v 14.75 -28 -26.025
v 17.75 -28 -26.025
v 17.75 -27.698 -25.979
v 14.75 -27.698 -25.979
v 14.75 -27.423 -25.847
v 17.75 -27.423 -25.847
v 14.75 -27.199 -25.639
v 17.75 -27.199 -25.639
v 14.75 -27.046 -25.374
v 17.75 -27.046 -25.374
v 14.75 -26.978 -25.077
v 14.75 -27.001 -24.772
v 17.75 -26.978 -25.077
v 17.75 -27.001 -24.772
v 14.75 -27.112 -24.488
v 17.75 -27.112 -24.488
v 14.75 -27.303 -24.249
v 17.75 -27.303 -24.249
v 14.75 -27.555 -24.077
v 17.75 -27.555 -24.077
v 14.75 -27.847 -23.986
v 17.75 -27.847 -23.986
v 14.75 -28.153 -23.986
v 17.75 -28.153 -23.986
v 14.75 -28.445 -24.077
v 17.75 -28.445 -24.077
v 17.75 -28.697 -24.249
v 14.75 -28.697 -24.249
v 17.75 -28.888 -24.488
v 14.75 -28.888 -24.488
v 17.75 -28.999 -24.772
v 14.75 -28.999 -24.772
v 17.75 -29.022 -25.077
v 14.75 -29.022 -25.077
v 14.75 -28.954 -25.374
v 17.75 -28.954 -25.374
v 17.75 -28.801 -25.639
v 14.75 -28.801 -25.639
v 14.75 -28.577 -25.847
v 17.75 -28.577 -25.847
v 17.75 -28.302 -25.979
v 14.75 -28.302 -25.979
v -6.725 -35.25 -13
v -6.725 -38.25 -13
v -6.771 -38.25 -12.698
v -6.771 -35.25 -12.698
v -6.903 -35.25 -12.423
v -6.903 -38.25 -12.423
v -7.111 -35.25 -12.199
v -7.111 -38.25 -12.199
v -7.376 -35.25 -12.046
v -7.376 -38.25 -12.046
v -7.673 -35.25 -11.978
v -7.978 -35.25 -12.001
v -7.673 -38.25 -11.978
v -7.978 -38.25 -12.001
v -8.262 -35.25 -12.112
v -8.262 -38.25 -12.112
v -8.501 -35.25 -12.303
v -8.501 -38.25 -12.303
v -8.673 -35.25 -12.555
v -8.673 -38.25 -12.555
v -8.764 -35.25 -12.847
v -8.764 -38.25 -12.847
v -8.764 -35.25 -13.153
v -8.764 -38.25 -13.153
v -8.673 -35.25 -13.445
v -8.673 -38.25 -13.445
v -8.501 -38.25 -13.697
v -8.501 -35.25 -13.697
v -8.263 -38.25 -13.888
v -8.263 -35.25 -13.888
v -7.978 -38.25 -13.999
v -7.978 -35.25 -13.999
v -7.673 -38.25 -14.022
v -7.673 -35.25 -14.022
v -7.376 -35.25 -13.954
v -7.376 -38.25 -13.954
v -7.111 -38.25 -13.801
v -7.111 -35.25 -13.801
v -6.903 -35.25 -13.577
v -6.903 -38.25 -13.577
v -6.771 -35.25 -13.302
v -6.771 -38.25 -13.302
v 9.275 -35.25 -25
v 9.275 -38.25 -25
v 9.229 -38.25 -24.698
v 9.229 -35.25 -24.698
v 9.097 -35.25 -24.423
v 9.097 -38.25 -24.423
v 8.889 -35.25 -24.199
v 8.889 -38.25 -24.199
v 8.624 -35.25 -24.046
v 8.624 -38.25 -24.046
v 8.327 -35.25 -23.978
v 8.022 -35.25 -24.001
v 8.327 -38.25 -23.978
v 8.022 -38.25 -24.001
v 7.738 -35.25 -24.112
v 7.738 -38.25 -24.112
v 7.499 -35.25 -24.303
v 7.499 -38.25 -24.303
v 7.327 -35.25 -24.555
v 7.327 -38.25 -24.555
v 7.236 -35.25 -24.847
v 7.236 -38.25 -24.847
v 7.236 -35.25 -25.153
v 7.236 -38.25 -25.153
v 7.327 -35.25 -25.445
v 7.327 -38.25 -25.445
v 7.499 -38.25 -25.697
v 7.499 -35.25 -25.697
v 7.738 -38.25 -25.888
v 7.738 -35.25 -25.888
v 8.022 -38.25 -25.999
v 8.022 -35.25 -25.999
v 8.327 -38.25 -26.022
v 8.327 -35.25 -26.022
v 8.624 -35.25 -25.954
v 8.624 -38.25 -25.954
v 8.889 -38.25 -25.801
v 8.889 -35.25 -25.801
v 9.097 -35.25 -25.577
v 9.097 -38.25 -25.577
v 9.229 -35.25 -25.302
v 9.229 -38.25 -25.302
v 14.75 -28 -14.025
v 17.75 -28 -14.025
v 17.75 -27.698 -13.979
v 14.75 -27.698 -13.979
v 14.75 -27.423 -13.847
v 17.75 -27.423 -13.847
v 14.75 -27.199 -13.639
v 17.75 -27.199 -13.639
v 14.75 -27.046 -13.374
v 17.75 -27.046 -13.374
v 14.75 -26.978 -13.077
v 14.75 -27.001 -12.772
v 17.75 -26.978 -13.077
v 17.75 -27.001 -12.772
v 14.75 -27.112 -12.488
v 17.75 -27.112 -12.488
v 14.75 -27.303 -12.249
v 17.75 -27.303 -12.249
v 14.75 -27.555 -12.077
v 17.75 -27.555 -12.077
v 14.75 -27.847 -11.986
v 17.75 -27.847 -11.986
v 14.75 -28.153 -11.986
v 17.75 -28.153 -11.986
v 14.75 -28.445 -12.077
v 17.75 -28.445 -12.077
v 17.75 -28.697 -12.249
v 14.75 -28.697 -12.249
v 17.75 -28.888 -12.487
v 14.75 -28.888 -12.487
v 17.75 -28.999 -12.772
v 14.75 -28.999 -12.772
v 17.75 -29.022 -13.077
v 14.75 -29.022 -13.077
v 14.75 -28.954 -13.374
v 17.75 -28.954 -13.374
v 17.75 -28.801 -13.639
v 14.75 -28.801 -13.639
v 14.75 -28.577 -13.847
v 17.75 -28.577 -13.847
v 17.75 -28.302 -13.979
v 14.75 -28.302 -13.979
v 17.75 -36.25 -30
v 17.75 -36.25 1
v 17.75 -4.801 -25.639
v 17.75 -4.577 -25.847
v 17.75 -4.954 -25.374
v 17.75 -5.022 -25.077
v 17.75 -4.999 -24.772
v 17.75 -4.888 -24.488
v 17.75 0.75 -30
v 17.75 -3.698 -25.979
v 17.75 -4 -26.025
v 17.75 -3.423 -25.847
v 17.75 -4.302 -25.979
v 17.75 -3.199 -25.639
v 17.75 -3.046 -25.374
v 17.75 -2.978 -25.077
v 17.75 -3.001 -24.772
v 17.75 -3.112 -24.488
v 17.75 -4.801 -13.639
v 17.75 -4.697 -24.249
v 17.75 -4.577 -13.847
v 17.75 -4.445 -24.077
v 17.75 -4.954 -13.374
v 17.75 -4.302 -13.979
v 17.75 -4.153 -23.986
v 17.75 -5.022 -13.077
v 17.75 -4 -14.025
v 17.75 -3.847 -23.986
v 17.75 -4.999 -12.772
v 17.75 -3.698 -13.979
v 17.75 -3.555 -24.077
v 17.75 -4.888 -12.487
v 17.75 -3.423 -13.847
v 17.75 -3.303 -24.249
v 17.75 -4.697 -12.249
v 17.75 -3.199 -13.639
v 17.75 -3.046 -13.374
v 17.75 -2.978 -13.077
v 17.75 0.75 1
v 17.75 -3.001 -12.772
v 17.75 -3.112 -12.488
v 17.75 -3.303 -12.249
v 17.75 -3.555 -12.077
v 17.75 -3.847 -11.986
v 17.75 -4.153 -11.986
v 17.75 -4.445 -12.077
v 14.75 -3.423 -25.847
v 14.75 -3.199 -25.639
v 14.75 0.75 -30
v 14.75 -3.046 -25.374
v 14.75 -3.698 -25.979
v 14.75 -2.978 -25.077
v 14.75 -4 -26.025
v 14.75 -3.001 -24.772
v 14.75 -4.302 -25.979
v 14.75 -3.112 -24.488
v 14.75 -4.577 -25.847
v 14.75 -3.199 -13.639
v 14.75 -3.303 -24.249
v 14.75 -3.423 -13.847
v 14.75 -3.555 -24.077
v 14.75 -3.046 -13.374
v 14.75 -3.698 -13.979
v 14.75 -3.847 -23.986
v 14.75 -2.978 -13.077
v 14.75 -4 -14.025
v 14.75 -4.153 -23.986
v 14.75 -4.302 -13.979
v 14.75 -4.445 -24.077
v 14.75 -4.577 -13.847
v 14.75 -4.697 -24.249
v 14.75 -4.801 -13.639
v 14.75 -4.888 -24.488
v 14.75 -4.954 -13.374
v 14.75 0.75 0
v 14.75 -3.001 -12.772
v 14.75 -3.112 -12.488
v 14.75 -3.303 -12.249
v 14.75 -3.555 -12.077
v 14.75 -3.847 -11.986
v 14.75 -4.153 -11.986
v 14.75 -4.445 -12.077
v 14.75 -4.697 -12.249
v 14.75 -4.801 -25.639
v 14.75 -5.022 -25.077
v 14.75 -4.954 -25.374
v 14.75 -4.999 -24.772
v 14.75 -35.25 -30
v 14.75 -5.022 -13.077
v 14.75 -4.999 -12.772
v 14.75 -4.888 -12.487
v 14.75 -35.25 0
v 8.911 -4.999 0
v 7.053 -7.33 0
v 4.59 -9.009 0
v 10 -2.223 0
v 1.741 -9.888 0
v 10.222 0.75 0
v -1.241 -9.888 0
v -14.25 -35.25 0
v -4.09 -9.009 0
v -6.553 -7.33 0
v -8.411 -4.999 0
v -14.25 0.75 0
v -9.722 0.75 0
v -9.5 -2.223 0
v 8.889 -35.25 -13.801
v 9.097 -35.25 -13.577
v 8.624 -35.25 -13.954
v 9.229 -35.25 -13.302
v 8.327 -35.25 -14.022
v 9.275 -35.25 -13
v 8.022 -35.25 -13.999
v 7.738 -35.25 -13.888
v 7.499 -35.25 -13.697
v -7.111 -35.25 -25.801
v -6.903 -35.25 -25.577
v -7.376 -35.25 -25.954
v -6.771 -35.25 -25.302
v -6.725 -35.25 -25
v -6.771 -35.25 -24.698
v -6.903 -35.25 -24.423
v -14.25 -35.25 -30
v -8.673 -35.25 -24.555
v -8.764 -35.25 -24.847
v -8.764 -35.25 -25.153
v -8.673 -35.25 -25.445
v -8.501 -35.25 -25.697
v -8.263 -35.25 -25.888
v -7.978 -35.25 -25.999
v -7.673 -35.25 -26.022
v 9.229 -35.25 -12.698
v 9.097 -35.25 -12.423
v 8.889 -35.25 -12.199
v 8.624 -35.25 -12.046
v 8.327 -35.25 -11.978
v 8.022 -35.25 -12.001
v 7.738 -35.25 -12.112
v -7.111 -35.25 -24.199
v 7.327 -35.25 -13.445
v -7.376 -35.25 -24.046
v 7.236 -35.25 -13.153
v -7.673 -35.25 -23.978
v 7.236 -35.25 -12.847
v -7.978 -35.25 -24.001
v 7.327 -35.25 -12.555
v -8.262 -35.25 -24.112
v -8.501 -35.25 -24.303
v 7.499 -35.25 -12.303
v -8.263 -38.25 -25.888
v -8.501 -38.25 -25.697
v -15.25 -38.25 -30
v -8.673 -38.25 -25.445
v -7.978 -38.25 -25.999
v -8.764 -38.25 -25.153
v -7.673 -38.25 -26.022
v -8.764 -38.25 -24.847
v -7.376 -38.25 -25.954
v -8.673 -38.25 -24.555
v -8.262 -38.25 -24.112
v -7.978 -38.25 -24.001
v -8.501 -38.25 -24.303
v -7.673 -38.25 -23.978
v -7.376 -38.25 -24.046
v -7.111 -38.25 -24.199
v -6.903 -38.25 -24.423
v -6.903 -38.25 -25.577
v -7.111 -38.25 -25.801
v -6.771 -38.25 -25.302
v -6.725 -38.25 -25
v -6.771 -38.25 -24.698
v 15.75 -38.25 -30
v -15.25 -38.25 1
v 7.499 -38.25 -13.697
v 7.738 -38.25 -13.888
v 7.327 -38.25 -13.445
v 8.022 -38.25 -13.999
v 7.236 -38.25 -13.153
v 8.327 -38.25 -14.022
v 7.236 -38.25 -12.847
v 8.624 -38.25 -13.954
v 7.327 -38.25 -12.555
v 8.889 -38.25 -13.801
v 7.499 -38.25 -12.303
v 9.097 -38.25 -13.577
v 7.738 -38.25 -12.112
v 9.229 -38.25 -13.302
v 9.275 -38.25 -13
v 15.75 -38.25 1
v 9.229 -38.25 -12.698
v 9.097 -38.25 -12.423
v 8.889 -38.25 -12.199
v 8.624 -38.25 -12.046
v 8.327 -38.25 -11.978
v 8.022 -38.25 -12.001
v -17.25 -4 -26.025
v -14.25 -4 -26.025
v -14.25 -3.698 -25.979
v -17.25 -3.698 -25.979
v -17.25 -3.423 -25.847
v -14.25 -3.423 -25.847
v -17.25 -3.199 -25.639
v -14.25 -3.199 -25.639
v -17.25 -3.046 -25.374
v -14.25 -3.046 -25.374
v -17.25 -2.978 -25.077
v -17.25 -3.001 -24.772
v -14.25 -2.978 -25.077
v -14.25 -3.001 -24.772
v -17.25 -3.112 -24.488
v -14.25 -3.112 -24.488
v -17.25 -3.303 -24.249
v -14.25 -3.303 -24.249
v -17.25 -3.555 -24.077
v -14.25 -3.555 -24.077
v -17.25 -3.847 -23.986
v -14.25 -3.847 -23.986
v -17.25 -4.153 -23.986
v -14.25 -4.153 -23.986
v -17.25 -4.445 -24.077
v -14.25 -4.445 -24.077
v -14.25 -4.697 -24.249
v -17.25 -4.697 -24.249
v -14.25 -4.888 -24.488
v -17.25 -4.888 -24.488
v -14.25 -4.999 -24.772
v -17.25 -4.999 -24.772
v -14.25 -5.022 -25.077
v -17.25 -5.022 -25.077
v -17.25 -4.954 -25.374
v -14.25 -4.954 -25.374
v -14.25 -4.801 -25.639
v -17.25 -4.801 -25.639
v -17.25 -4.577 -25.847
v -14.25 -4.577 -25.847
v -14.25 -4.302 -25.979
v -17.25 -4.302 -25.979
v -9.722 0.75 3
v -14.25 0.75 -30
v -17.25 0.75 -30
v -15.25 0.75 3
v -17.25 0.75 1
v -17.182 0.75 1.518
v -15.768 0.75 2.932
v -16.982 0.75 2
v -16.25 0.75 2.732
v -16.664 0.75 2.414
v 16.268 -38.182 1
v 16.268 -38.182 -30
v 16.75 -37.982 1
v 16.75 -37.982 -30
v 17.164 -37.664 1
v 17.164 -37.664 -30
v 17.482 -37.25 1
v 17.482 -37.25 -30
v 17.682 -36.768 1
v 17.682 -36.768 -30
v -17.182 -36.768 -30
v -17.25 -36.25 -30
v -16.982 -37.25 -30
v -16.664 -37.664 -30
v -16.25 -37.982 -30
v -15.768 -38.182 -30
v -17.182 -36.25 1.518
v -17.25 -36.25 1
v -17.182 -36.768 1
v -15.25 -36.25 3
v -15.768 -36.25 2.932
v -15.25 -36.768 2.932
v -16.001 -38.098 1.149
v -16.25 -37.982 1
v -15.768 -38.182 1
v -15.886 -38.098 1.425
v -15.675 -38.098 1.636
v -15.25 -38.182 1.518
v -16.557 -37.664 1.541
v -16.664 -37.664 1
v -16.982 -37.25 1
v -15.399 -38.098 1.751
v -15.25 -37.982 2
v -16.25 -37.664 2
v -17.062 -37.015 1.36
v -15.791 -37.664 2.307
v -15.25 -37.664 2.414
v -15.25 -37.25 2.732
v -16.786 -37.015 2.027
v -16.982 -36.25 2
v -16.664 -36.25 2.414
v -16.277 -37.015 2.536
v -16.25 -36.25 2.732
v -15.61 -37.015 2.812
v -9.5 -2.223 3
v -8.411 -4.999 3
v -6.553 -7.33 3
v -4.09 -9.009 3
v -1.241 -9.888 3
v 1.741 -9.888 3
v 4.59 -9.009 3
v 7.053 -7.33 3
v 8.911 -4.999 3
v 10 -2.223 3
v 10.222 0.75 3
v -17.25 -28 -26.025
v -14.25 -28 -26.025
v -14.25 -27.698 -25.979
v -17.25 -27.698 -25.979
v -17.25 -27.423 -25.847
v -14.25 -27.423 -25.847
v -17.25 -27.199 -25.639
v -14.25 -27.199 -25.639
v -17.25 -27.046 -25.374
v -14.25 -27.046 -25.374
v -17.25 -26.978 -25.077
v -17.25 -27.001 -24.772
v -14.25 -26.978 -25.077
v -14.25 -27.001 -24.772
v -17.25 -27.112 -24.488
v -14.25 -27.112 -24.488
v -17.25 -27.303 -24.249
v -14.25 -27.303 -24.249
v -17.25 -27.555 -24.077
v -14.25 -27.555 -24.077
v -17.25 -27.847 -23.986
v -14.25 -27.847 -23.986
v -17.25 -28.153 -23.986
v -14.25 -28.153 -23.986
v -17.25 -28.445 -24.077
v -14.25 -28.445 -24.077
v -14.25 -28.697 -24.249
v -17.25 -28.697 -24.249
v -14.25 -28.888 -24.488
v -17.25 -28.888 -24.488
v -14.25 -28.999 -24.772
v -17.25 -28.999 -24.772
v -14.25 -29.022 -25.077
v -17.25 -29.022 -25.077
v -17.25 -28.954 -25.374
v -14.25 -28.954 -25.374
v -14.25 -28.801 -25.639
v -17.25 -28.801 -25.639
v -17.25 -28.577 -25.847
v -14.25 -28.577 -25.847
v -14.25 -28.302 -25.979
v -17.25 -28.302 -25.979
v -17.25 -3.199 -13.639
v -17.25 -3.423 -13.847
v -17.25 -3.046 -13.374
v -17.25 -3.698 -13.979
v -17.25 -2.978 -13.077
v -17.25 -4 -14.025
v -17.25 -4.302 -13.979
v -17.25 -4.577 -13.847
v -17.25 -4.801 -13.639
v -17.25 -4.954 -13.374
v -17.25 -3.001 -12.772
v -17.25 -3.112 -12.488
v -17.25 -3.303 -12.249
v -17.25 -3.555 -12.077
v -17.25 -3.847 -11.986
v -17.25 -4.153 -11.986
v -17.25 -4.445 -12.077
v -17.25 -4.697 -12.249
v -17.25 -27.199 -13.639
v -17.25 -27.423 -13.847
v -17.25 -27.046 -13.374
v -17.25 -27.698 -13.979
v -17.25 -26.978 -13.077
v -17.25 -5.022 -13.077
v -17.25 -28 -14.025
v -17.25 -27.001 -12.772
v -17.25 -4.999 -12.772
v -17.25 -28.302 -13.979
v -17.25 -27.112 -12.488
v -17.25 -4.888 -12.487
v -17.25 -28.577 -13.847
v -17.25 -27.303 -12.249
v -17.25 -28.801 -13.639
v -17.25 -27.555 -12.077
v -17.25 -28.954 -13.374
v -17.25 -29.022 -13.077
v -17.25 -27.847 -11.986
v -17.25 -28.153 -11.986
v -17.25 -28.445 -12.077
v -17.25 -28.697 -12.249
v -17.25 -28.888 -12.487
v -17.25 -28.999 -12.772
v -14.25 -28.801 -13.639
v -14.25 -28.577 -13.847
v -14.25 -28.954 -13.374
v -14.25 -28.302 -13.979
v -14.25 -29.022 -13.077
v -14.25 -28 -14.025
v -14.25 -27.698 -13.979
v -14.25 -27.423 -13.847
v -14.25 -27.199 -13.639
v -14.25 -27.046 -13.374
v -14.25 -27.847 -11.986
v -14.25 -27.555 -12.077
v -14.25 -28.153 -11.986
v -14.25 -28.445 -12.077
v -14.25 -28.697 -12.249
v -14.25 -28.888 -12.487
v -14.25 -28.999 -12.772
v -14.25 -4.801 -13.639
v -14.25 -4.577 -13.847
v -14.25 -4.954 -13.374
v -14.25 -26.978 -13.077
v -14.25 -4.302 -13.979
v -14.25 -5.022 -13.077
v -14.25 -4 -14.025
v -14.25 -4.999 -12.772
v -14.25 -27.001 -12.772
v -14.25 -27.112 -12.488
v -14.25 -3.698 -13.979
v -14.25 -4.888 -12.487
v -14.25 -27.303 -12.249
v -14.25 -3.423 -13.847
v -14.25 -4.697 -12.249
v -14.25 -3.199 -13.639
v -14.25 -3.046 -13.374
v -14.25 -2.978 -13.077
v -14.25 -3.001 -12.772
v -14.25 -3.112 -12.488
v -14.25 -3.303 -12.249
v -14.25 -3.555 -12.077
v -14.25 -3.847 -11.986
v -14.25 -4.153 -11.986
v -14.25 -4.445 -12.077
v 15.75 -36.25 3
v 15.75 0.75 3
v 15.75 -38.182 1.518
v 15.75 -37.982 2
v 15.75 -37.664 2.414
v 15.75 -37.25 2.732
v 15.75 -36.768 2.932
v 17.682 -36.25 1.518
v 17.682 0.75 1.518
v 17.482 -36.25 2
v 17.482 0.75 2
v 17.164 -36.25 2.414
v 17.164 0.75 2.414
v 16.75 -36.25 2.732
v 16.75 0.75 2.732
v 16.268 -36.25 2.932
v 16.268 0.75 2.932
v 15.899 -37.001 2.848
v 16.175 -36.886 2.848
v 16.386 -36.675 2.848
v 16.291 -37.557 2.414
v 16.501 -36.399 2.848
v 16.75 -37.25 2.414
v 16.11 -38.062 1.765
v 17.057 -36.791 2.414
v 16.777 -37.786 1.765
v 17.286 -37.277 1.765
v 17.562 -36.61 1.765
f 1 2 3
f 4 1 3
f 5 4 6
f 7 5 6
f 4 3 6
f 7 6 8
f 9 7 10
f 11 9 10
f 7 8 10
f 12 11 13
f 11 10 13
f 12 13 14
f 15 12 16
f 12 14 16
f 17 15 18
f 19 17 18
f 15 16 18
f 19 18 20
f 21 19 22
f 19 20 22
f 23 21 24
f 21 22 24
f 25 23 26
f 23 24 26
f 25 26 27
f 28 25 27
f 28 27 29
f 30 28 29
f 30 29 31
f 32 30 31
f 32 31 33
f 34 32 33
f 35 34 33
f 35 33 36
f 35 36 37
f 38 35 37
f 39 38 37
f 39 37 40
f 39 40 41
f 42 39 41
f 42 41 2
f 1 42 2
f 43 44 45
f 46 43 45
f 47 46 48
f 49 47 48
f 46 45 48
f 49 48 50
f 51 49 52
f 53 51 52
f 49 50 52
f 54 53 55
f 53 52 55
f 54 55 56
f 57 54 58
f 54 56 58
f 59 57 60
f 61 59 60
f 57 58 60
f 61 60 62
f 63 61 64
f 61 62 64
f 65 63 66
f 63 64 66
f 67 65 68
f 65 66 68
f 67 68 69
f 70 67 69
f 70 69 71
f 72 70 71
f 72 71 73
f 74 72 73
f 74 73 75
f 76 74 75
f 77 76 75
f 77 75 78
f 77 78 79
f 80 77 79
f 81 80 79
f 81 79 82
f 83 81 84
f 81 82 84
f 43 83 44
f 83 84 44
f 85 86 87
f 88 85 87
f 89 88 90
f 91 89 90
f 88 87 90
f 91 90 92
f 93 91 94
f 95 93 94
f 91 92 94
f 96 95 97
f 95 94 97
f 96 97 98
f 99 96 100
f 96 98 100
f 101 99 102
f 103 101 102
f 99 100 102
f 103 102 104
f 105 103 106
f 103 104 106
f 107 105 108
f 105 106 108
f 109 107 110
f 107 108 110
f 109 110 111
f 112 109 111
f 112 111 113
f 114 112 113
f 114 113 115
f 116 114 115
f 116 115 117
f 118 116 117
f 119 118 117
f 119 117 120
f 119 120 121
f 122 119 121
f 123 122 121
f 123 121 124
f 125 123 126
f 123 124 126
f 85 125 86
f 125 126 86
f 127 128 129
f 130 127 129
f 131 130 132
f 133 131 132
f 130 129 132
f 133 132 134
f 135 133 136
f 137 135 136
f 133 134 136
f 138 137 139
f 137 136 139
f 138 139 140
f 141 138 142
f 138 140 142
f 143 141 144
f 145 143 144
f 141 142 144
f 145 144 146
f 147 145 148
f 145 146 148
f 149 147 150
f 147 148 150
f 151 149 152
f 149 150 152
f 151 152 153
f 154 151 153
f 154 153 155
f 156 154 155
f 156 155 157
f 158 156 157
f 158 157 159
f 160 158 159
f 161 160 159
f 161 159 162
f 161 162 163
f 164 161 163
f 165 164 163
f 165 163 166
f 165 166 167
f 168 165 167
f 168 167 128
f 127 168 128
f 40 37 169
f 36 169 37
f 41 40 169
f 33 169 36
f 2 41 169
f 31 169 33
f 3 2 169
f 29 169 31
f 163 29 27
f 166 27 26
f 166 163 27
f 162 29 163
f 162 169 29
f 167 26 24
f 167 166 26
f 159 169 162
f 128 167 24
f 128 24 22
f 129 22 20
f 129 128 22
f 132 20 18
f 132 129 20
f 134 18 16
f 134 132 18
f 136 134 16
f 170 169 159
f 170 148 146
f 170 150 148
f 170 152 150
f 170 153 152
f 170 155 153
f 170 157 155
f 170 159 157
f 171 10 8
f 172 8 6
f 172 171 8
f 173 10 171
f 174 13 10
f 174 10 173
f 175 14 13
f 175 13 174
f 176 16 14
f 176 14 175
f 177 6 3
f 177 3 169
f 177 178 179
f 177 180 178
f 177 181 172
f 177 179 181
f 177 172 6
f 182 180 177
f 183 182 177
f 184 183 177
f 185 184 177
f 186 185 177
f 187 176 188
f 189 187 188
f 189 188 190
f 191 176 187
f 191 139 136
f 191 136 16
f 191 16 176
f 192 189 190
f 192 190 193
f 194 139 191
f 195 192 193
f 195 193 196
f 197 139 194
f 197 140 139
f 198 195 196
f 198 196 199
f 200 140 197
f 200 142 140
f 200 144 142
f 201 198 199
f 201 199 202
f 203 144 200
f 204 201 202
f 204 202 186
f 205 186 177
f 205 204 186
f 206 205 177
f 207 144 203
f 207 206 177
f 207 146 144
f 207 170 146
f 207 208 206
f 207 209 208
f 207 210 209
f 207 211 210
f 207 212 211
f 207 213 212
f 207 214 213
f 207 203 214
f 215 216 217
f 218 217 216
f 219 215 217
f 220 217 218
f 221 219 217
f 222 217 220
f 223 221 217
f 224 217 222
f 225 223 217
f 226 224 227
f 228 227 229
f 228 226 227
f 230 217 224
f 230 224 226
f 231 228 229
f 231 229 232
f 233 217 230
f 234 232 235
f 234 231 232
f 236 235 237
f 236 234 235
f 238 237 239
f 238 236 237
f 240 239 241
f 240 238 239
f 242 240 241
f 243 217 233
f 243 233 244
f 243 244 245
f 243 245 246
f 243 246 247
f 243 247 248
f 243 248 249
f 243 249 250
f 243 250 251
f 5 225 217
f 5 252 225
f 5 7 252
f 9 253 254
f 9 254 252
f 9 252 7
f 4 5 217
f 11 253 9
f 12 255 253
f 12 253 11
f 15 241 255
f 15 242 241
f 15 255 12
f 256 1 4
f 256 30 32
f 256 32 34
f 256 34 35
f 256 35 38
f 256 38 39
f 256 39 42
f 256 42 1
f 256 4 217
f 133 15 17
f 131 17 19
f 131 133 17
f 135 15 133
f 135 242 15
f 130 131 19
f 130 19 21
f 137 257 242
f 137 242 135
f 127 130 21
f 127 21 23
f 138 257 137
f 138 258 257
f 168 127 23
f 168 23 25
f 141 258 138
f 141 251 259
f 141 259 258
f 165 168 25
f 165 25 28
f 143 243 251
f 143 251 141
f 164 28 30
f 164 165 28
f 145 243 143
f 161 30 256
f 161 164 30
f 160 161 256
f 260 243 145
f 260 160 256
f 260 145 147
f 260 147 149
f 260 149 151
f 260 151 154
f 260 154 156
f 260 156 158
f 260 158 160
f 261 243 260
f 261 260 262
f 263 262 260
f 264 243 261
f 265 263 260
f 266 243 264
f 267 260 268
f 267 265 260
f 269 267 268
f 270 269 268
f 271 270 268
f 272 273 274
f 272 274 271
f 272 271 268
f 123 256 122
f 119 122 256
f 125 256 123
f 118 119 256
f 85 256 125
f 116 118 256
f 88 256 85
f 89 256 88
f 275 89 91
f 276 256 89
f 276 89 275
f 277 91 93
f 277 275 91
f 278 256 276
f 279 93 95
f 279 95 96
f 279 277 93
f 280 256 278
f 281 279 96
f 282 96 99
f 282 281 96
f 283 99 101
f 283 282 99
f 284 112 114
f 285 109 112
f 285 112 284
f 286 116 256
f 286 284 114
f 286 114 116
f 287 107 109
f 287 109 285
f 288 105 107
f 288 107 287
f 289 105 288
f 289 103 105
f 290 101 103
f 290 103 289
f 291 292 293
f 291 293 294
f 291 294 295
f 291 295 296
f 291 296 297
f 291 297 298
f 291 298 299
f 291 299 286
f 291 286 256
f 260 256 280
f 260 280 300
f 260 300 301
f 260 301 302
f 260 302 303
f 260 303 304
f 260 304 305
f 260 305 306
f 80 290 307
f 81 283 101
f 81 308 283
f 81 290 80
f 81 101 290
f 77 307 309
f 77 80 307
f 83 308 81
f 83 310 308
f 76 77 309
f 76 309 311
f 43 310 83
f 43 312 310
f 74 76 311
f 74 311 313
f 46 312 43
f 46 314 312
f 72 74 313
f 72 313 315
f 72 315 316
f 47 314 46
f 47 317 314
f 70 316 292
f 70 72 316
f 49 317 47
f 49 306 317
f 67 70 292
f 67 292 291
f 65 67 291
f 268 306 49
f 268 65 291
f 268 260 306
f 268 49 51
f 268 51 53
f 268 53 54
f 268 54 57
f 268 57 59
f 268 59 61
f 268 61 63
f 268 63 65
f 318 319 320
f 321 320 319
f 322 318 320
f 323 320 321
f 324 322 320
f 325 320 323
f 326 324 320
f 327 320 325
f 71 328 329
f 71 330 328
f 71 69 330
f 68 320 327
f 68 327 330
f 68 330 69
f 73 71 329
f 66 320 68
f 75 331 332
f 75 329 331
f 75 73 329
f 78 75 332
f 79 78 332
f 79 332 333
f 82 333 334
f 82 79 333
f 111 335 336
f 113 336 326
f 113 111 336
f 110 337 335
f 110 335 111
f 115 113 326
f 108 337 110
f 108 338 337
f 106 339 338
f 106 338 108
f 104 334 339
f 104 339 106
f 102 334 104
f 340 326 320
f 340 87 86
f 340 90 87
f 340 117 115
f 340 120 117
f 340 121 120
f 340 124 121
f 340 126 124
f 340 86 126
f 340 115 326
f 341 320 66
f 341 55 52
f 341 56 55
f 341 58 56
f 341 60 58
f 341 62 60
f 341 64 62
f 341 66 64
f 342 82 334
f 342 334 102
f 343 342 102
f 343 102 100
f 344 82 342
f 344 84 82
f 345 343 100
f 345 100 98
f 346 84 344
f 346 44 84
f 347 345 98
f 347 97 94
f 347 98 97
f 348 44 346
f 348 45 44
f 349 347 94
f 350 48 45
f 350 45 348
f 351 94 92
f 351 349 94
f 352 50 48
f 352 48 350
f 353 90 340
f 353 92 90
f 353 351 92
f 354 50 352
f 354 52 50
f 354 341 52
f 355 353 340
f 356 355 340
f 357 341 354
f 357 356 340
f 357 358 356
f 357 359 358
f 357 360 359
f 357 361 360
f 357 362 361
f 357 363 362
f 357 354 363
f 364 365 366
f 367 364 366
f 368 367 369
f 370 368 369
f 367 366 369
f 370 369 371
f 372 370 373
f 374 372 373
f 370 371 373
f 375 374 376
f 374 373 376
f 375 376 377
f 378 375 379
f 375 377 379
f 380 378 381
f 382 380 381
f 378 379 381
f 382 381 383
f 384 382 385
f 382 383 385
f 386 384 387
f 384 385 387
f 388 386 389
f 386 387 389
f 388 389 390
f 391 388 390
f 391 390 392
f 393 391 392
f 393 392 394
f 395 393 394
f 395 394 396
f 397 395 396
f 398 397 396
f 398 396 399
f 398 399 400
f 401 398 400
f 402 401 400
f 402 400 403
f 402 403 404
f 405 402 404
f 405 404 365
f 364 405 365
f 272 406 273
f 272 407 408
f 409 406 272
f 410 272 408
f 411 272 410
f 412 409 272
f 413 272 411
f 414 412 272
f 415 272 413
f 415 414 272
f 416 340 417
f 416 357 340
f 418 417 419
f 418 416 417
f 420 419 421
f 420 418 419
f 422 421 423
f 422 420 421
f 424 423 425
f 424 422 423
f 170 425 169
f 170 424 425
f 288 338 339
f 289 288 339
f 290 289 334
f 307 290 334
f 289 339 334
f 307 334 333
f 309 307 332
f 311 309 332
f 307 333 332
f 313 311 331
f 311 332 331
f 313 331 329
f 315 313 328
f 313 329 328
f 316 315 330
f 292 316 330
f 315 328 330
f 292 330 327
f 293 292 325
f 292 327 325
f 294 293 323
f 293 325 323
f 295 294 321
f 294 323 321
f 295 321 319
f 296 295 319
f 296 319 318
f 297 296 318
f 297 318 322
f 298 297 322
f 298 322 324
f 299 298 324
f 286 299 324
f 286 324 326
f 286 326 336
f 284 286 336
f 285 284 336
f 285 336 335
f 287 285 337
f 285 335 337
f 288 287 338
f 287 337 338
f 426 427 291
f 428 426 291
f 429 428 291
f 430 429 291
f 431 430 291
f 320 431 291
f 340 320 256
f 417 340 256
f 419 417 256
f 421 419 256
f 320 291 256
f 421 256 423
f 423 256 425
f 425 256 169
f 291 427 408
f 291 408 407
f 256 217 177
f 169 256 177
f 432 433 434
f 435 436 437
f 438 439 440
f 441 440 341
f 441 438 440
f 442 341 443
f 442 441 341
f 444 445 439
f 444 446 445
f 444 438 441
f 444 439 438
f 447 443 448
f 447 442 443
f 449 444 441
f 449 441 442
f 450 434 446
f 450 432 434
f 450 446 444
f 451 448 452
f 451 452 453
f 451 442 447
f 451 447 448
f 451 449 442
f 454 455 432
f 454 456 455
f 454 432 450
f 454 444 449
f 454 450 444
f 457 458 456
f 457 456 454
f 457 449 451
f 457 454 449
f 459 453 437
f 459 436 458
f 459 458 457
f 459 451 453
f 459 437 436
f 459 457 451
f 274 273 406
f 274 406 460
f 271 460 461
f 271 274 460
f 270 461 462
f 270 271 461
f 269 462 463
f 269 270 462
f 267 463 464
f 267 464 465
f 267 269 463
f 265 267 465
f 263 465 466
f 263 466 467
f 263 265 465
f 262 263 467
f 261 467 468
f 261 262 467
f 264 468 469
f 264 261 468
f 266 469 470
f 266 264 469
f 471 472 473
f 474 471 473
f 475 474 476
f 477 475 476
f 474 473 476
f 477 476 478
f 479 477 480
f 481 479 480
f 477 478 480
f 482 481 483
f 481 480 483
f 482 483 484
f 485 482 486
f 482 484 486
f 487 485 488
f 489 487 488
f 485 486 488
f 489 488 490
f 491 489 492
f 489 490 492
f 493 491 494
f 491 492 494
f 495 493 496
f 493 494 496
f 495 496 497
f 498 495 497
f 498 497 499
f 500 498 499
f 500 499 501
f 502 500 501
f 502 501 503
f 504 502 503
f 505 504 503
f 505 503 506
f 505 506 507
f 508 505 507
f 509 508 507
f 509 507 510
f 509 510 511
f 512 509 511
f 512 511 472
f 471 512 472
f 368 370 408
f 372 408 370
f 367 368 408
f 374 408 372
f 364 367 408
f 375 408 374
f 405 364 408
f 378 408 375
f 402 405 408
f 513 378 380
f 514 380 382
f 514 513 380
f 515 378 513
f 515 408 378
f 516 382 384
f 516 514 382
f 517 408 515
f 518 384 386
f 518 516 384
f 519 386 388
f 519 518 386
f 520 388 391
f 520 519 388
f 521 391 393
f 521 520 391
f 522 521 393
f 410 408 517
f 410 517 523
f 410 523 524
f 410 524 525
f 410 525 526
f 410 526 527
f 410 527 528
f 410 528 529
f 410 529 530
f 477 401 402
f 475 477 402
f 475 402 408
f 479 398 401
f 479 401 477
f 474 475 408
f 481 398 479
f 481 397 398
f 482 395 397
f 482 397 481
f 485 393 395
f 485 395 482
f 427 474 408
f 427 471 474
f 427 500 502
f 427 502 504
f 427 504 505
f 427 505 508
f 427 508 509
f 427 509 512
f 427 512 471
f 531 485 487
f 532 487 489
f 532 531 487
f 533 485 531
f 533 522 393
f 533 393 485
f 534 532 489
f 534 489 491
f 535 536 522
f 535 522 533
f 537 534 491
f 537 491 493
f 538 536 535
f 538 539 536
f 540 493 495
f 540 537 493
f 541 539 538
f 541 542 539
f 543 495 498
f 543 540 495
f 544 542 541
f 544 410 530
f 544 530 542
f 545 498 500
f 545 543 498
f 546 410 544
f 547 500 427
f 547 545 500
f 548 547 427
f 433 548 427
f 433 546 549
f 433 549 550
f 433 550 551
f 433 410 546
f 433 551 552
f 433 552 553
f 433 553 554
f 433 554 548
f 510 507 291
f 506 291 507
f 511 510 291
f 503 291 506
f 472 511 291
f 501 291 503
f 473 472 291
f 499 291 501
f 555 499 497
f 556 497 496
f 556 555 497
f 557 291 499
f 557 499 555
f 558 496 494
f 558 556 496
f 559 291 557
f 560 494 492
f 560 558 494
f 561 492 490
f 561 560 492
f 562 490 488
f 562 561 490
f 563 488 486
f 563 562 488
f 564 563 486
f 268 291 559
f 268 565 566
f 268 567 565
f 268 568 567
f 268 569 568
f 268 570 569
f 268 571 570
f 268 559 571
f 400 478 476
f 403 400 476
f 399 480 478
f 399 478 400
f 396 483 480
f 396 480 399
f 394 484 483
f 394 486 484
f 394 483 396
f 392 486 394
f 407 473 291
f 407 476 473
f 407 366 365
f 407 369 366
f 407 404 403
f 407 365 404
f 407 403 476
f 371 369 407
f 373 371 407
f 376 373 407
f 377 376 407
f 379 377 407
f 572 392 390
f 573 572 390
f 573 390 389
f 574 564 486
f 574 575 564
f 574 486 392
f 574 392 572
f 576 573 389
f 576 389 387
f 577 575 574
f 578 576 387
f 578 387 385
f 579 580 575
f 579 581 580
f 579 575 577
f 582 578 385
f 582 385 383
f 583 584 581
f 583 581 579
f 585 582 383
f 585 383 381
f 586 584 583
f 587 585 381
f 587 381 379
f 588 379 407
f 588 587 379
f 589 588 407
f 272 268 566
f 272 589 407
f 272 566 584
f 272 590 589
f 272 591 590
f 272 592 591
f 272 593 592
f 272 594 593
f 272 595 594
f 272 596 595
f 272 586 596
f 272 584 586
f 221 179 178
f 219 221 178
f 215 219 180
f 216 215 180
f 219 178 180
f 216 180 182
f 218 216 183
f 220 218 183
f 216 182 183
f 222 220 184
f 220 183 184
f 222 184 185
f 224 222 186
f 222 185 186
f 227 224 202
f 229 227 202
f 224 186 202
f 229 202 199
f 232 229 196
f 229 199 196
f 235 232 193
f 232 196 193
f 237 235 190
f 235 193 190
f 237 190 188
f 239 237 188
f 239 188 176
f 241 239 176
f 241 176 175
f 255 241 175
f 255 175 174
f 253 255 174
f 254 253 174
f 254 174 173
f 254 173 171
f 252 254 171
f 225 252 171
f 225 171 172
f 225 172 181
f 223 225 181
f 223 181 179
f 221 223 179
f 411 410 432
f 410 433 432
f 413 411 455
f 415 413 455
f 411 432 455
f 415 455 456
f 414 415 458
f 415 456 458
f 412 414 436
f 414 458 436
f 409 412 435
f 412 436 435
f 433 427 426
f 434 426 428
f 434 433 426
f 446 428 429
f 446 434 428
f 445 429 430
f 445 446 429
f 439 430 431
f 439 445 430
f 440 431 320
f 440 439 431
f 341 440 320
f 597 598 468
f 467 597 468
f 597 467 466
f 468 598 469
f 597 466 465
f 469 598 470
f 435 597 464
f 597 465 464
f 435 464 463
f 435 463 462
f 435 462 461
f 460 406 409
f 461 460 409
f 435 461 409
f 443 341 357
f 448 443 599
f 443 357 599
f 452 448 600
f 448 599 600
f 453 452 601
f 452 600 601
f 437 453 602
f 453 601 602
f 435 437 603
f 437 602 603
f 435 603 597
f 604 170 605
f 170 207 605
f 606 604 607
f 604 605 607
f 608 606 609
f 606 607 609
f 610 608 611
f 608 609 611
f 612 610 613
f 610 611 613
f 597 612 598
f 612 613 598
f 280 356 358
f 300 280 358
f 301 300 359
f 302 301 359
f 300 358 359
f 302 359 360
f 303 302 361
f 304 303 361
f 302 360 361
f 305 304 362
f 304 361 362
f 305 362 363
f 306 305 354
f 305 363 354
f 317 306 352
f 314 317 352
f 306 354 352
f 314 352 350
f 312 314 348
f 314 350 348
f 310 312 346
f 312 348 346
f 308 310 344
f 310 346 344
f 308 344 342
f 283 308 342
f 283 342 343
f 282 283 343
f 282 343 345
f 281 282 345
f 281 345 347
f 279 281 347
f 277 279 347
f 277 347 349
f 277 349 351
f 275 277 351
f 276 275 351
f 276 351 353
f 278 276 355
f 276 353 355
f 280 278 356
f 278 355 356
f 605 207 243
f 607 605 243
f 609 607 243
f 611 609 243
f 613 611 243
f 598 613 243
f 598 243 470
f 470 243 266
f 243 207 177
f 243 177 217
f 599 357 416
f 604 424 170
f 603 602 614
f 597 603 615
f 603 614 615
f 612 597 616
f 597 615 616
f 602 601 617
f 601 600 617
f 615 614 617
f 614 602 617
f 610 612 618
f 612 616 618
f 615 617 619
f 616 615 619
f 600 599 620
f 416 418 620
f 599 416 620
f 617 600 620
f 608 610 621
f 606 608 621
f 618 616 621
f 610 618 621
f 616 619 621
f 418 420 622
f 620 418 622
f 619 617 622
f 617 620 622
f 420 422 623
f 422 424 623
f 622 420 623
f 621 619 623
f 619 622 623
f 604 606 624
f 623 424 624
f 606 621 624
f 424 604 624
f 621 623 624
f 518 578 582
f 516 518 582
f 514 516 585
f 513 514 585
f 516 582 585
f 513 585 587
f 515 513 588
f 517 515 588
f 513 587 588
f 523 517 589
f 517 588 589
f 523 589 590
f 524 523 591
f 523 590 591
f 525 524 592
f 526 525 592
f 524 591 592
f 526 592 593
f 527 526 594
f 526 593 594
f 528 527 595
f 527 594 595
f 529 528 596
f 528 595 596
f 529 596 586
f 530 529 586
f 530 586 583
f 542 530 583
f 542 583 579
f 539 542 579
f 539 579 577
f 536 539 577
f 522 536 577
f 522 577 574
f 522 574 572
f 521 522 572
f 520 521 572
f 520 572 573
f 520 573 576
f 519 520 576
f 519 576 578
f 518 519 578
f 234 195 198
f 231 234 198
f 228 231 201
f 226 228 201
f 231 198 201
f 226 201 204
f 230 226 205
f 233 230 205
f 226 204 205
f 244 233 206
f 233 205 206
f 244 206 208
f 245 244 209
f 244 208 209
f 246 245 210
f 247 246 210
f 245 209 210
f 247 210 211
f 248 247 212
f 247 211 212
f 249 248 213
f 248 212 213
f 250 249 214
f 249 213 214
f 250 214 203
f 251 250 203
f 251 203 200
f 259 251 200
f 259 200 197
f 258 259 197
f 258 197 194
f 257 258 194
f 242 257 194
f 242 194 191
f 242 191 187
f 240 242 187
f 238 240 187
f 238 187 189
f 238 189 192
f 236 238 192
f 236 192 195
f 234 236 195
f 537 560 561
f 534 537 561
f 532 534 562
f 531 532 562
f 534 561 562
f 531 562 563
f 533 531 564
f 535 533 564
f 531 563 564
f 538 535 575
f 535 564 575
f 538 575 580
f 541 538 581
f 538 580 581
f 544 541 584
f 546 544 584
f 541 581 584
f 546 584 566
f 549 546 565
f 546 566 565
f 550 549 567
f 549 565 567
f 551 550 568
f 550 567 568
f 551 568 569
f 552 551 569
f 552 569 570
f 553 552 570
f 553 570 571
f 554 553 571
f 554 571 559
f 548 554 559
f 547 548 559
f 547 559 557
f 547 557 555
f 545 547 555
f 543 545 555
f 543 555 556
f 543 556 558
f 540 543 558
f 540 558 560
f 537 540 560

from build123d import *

# Parameters (mm, degrees)
EXTRUDE_1_DEPTH     = 3
EXTRUDE_2_DEPTH     = 30
SKETCH_3_R          = 1.025
CUT_EXTRUDE_1_DEPTH = 43
SKETCH_4_R          = 1.025
CUT_EXTRUDE_2_DEPTH = 3
FILLET_1_R          = 2


with BuildPart() as part:
    # 스케치2 → 보스-돌출1 (new body)
    with BuildSketch(Plane.XY):
        with BuildLine():
            Line((17.75, 0.75), (10.221835338, 0.75))
            ThreePointArc((10.221835338, 0.75), (0.25, -10), (-9.721835338, 0.75))
            Line((-9.721835338, 0.75), (-17.25, 0.75))
            Line((-17.25, 0.75), (-17.25, -38.25))
            Line((-17.25, -38.25), (17.75, -38.25))
            Line((17.75, -38.25), (17.75, 0.75))
        make_face()
    extrude(amount=EXTRUDE_1_DEPTH)

    # 스케치2<6> → 보스-돌출2 (add)
    with BuildSketch(Plane.XY):
        Polygon((14.75, 0.75), (14.75, -35.25), (-14.25, -35.25), (-14.25, 0.75), (-17.25, 0.75), (-17.25, -38.25), (17.75, -38.25), (17.75, 0.75), align=None)
    extrude(amount=-EXTRUDE_2_DEPTH)

    # 스케치3 → 컷-돌출1 (cut)
    with BuildSketch(Plane(origin=(17.75, 0, 0), x_dir=(0, 0, -1), z_dir=(1, 0, 0))):
        with Locations((25, -4)):
            Circle(SKETCH_3_R)
        with Locations((13, -4)):
            Circle(SKETCH_3_R)
        with Locations((25, -28)):
            Circle(SKETCH_3_R)
        with Locations((13, -28)):
            Circle(SKETCH_3_R)
    extrude(amount=-CUT_EXTRUDE_1_DEPTH, mode=Mode.SUBTRACT)

    # 스케치4 → 컷-돌출2 (cut)
    with BuildSketch(Plane.XZ.offset(38.25)):
        with Locations((8.25, -25)):
            Circle(SKETCH_4_R)
        with Locations((-7.75, -25)):
            Circle(SKETCH_4_R)
        with Locations((-7.75, -13)):
            Circle(SKETCH_4_R)
        with Locations((8.25, -13)):
            Circle(SKETCH_4_R)
    extrude(amount=-CUT_EXTRUDE_2_DEPTH, mode=Mode.SUBTRACT)

    # 필렛1
    fillet_1_edges = [part.edges().sort_by_distance(p)[0] for p in [
        (-17.25, -18.75, 3),
        (-17.25, -38.25, -13.5),
        (17.75, -38.25, -13.5),
        (0.25, -38.25, 3),
        (17.75, -18.75, 3),
    ]]
    fillet(fillet_1_edges, radius=FILLET_1_R)


solid = part.part
